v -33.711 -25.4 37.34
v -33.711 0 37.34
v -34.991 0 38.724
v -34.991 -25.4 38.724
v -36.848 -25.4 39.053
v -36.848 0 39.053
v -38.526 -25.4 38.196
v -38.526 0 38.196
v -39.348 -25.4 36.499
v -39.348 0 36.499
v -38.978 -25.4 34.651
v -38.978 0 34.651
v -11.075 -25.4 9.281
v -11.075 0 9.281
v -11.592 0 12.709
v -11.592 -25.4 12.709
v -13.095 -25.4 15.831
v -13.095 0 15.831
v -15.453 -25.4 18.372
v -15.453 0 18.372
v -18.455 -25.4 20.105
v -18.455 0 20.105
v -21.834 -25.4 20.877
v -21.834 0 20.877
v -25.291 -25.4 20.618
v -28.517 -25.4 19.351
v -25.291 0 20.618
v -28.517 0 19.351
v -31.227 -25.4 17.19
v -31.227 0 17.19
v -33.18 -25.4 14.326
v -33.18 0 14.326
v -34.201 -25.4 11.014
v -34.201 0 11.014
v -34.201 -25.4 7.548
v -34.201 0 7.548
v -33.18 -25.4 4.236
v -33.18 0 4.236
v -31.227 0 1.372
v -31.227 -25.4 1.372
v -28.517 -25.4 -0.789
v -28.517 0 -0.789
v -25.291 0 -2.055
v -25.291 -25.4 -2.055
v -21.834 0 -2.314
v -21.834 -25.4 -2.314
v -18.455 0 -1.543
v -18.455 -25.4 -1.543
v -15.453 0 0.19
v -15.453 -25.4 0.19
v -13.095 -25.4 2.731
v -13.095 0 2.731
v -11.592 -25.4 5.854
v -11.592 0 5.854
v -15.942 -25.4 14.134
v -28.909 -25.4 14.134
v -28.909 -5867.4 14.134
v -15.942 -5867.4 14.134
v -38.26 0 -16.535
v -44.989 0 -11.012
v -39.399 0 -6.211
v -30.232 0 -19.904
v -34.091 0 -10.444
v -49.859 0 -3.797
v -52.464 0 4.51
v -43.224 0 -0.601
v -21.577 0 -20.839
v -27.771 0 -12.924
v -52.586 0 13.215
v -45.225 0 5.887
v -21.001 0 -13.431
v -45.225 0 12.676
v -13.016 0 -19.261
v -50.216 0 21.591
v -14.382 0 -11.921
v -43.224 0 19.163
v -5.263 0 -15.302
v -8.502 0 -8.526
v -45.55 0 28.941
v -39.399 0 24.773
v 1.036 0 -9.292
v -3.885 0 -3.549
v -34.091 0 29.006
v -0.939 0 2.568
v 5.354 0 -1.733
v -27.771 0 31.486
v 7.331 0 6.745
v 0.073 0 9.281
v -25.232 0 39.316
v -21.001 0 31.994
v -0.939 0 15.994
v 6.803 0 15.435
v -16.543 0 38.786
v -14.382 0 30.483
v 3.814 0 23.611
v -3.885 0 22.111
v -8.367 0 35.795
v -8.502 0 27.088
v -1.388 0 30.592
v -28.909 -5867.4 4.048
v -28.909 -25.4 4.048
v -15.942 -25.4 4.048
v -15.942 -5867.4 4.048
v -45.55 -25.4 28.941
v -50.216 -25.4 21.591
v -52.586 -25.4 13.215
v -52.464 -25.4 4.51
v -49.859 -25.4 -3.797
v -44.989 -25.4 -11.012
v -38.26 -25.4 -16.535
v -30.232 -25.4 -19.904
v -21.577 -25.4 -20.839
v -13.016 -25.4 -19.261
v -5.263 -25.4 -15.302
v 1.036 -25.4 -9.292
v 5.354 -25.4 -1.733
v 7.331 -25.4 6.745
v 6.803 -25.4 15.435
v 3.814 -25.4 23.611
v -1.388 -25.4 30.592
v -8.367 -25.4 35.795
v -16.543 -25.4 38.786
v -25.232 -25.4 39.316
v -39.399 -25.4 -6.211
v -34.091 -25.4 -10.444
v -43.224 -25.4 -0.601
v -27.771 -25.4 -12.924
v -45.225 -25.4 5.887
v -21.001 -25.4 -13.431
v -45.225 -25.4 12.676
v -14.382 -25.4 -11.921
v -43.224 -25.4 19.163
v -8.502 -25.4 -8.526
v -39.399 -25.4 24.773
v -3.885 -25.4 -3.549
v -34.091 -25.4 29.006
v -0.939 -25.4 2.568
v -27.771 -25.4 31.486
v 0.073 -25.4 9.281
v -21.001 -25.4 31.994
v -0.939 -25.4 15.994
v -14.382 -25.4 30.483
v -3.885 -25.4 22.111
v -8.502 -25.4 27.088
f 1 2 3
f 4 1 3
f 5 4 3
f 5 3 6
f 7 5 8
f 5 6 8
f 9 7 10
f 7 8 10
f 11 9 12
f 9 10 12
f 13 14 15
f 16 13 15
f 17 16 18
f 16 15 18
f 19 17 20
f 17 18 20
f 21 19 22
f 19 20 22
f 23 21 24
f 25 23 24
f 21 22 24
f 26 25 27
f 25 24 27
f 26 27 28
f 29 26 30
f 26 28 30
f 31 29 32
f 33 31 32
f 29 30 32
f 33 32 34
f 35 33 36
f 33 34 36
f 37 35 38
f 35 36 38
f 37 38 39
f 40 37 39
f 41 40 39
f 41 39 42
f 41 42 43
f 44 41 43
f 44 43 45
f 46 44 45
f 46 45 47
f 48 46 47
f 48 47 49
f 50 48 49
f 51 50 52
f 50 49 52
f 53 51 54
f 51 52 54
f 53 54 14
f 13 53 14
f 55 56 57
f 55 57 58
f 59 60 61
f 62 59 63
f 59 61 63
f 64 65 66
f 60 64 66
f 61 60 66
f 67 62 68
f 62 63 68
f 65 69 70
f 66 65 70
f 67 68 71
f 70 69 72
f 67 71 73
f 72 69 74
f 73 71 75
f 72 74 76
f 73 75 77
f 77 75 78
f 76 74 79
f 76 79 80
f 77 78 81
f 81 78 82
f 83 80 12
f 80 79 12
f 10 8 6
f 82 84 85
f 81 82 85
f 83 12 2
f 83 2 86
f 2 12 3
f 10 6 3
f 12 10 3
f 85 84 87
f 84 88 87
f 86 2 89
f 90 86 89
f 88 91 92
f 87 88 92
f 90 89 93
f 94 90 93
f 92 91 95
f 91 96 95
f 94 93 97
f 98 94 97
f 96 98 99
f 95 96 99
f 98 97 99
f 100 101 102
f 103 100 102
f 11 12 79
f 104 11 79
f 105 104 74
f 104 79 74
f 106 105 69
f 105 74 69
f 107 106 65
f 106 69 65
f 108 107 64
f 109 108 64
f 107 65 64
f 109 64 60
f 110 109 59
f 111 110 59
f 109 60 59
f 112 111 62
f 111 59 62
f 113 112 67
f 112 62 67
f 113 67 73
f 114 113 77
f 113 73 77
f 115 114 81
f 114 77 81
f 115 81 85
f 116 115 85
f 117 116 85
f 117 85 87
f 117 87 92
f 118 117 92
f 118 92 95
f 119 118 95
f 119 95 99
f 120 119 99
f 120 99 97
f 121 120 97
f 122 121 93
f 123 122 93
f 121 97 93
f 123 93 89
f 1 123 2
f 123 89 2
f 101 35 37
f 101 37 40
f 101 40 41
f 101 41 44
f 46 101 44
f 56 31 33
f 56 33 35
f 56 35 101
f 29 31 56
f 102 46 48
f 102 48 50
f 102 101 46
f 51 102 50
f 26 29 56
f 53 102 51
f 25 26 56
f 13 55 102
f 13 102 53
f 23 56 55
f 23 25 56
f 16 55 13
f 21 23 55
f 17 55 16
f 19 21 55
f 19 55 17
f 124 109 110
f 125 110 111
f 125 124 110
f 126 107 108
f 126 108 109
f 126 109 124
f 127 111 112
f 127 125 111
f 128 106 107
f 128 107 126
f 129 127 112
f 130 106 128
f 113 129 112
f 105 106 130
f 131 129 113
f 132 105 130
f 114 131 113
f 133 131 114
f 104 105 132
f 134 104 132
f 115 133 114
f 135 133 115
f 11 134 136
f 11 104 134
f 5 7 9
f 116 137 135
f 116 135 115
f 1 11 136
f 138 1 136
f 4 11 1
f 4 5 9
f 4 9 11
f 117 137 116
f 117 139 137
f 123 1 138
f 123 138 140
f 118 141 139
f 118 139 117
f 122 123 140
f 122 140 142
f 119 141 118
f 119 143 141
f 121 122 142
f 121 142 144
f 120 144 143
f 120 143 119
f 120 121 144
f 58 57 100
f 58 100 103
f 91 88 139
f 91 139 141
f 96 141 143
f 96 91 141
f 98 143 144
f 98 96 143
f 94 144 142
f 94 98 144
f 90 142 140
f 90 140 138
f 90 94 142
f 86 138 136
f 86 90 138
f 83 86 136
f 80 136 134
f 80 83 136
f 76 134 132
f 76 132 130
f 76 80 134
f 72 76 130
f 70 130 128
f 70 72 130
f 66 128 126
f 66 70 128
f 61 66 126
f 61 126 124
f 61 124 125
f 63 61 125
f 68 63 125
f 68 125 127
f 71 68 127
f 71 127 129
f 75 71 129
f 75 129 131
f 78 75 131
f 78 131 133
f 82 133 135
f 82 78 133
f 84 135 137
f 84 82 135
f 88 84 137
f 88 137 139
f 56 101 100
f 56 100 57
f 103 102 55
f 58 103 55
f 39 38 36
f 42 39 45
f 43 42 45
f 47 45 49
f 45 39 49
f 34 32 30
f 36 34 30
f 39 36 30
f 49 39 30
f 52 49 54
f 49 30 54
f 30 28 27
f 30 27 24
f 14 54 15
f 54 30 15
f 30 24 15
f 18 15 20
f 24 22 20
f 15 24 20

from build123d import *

# Parameters (mm, degrees)
F0_R     = 22.7761001629
F1_DEPTH = 25.4
F0_R_2   = 11.6281056137
F2_W     = 12.9673983902
F2_H     = 10.0857559592
F3_DEPTH = 5842


with BuildPart() as f1:
    # F0 (on Front) → F1 (new body)
    with BuildSketch(Plane.XZ):
        with BuildLine():
            ThreePointArc((-38.9781716419, 34.6505036411), (-37.1587445813, -17.1673038716), (7.4380809076, 9.2811109498))
            ThreePointArc((7.4380809076, 9.2811109498), (-5.7220592873, 34.1835833315), (-33.7105806058, 37.3403372139))
            ThreePointArc((-33.7105806058, 37.3403372139), (-33.5156033639, 36.7464879743), (-33.4496309823, 36.1249409616))
            ThreePointArc((-33.4496309823, 36.1249409616), (-35.6475280227, 33.2640526713), (-38.9781716419, 34.6505036411))
        make_face()
        with Locations((-22.7030273527, 9.2811109498)):
            Circle(F0_R, mode=Mode.SUBTRACT)
        with BuildLine():
            ThreePointArc((-33.4496309823, 36.1249409616), (-33.5156033639, 36.7464879743), (-33.7105806058, 37.3403372139))
            ThreePointArc((-33.7105806058, 37.3403372139), (-36.4105142653, 36.1249409616), (-38.9781716419, 34.6505036411))
            ThreePointArc((-38.9781716419, 34.6505036411), (-35.6475280227, 33.2640526713), (-33.4496309823, 36.1249409616))
        make_face()
        with BuildLine():
            ThreePointArc((-38.9781716419, 34.6505036411), (-36.4105142653, 36.1249409616), (-33.7105806058, 37.3403372139))
            ThreePointArc((-33.7105806058, 37.3403372139), (-37.757056287, 38.7619192322), (-38.9781716419, 34.6505036411))
        make_face()
    extrude(amount=F1_DEPTH)


with BuildPart() as f1b:
    # F0 (on Front) → F1, piece 2 (new body)
    with BuildSketch(Plane.XZ):
        with Locations((-22.7030273527, 9.2811109498)):
            Circle(F0_R_2)
    extrude(amount=F1_DEPTH)

    # F2 (on face) → F3 (join)
    with BuildSketch(Plane.XZ.offset(25.4)):
        with Locations((-22.4253004417, 9.0910159051)):
            Rectangle(F2_W, F2_H)
    extrude(amount=F3_DEPTH)


solid = Compound([f1.part, f1b.part])
